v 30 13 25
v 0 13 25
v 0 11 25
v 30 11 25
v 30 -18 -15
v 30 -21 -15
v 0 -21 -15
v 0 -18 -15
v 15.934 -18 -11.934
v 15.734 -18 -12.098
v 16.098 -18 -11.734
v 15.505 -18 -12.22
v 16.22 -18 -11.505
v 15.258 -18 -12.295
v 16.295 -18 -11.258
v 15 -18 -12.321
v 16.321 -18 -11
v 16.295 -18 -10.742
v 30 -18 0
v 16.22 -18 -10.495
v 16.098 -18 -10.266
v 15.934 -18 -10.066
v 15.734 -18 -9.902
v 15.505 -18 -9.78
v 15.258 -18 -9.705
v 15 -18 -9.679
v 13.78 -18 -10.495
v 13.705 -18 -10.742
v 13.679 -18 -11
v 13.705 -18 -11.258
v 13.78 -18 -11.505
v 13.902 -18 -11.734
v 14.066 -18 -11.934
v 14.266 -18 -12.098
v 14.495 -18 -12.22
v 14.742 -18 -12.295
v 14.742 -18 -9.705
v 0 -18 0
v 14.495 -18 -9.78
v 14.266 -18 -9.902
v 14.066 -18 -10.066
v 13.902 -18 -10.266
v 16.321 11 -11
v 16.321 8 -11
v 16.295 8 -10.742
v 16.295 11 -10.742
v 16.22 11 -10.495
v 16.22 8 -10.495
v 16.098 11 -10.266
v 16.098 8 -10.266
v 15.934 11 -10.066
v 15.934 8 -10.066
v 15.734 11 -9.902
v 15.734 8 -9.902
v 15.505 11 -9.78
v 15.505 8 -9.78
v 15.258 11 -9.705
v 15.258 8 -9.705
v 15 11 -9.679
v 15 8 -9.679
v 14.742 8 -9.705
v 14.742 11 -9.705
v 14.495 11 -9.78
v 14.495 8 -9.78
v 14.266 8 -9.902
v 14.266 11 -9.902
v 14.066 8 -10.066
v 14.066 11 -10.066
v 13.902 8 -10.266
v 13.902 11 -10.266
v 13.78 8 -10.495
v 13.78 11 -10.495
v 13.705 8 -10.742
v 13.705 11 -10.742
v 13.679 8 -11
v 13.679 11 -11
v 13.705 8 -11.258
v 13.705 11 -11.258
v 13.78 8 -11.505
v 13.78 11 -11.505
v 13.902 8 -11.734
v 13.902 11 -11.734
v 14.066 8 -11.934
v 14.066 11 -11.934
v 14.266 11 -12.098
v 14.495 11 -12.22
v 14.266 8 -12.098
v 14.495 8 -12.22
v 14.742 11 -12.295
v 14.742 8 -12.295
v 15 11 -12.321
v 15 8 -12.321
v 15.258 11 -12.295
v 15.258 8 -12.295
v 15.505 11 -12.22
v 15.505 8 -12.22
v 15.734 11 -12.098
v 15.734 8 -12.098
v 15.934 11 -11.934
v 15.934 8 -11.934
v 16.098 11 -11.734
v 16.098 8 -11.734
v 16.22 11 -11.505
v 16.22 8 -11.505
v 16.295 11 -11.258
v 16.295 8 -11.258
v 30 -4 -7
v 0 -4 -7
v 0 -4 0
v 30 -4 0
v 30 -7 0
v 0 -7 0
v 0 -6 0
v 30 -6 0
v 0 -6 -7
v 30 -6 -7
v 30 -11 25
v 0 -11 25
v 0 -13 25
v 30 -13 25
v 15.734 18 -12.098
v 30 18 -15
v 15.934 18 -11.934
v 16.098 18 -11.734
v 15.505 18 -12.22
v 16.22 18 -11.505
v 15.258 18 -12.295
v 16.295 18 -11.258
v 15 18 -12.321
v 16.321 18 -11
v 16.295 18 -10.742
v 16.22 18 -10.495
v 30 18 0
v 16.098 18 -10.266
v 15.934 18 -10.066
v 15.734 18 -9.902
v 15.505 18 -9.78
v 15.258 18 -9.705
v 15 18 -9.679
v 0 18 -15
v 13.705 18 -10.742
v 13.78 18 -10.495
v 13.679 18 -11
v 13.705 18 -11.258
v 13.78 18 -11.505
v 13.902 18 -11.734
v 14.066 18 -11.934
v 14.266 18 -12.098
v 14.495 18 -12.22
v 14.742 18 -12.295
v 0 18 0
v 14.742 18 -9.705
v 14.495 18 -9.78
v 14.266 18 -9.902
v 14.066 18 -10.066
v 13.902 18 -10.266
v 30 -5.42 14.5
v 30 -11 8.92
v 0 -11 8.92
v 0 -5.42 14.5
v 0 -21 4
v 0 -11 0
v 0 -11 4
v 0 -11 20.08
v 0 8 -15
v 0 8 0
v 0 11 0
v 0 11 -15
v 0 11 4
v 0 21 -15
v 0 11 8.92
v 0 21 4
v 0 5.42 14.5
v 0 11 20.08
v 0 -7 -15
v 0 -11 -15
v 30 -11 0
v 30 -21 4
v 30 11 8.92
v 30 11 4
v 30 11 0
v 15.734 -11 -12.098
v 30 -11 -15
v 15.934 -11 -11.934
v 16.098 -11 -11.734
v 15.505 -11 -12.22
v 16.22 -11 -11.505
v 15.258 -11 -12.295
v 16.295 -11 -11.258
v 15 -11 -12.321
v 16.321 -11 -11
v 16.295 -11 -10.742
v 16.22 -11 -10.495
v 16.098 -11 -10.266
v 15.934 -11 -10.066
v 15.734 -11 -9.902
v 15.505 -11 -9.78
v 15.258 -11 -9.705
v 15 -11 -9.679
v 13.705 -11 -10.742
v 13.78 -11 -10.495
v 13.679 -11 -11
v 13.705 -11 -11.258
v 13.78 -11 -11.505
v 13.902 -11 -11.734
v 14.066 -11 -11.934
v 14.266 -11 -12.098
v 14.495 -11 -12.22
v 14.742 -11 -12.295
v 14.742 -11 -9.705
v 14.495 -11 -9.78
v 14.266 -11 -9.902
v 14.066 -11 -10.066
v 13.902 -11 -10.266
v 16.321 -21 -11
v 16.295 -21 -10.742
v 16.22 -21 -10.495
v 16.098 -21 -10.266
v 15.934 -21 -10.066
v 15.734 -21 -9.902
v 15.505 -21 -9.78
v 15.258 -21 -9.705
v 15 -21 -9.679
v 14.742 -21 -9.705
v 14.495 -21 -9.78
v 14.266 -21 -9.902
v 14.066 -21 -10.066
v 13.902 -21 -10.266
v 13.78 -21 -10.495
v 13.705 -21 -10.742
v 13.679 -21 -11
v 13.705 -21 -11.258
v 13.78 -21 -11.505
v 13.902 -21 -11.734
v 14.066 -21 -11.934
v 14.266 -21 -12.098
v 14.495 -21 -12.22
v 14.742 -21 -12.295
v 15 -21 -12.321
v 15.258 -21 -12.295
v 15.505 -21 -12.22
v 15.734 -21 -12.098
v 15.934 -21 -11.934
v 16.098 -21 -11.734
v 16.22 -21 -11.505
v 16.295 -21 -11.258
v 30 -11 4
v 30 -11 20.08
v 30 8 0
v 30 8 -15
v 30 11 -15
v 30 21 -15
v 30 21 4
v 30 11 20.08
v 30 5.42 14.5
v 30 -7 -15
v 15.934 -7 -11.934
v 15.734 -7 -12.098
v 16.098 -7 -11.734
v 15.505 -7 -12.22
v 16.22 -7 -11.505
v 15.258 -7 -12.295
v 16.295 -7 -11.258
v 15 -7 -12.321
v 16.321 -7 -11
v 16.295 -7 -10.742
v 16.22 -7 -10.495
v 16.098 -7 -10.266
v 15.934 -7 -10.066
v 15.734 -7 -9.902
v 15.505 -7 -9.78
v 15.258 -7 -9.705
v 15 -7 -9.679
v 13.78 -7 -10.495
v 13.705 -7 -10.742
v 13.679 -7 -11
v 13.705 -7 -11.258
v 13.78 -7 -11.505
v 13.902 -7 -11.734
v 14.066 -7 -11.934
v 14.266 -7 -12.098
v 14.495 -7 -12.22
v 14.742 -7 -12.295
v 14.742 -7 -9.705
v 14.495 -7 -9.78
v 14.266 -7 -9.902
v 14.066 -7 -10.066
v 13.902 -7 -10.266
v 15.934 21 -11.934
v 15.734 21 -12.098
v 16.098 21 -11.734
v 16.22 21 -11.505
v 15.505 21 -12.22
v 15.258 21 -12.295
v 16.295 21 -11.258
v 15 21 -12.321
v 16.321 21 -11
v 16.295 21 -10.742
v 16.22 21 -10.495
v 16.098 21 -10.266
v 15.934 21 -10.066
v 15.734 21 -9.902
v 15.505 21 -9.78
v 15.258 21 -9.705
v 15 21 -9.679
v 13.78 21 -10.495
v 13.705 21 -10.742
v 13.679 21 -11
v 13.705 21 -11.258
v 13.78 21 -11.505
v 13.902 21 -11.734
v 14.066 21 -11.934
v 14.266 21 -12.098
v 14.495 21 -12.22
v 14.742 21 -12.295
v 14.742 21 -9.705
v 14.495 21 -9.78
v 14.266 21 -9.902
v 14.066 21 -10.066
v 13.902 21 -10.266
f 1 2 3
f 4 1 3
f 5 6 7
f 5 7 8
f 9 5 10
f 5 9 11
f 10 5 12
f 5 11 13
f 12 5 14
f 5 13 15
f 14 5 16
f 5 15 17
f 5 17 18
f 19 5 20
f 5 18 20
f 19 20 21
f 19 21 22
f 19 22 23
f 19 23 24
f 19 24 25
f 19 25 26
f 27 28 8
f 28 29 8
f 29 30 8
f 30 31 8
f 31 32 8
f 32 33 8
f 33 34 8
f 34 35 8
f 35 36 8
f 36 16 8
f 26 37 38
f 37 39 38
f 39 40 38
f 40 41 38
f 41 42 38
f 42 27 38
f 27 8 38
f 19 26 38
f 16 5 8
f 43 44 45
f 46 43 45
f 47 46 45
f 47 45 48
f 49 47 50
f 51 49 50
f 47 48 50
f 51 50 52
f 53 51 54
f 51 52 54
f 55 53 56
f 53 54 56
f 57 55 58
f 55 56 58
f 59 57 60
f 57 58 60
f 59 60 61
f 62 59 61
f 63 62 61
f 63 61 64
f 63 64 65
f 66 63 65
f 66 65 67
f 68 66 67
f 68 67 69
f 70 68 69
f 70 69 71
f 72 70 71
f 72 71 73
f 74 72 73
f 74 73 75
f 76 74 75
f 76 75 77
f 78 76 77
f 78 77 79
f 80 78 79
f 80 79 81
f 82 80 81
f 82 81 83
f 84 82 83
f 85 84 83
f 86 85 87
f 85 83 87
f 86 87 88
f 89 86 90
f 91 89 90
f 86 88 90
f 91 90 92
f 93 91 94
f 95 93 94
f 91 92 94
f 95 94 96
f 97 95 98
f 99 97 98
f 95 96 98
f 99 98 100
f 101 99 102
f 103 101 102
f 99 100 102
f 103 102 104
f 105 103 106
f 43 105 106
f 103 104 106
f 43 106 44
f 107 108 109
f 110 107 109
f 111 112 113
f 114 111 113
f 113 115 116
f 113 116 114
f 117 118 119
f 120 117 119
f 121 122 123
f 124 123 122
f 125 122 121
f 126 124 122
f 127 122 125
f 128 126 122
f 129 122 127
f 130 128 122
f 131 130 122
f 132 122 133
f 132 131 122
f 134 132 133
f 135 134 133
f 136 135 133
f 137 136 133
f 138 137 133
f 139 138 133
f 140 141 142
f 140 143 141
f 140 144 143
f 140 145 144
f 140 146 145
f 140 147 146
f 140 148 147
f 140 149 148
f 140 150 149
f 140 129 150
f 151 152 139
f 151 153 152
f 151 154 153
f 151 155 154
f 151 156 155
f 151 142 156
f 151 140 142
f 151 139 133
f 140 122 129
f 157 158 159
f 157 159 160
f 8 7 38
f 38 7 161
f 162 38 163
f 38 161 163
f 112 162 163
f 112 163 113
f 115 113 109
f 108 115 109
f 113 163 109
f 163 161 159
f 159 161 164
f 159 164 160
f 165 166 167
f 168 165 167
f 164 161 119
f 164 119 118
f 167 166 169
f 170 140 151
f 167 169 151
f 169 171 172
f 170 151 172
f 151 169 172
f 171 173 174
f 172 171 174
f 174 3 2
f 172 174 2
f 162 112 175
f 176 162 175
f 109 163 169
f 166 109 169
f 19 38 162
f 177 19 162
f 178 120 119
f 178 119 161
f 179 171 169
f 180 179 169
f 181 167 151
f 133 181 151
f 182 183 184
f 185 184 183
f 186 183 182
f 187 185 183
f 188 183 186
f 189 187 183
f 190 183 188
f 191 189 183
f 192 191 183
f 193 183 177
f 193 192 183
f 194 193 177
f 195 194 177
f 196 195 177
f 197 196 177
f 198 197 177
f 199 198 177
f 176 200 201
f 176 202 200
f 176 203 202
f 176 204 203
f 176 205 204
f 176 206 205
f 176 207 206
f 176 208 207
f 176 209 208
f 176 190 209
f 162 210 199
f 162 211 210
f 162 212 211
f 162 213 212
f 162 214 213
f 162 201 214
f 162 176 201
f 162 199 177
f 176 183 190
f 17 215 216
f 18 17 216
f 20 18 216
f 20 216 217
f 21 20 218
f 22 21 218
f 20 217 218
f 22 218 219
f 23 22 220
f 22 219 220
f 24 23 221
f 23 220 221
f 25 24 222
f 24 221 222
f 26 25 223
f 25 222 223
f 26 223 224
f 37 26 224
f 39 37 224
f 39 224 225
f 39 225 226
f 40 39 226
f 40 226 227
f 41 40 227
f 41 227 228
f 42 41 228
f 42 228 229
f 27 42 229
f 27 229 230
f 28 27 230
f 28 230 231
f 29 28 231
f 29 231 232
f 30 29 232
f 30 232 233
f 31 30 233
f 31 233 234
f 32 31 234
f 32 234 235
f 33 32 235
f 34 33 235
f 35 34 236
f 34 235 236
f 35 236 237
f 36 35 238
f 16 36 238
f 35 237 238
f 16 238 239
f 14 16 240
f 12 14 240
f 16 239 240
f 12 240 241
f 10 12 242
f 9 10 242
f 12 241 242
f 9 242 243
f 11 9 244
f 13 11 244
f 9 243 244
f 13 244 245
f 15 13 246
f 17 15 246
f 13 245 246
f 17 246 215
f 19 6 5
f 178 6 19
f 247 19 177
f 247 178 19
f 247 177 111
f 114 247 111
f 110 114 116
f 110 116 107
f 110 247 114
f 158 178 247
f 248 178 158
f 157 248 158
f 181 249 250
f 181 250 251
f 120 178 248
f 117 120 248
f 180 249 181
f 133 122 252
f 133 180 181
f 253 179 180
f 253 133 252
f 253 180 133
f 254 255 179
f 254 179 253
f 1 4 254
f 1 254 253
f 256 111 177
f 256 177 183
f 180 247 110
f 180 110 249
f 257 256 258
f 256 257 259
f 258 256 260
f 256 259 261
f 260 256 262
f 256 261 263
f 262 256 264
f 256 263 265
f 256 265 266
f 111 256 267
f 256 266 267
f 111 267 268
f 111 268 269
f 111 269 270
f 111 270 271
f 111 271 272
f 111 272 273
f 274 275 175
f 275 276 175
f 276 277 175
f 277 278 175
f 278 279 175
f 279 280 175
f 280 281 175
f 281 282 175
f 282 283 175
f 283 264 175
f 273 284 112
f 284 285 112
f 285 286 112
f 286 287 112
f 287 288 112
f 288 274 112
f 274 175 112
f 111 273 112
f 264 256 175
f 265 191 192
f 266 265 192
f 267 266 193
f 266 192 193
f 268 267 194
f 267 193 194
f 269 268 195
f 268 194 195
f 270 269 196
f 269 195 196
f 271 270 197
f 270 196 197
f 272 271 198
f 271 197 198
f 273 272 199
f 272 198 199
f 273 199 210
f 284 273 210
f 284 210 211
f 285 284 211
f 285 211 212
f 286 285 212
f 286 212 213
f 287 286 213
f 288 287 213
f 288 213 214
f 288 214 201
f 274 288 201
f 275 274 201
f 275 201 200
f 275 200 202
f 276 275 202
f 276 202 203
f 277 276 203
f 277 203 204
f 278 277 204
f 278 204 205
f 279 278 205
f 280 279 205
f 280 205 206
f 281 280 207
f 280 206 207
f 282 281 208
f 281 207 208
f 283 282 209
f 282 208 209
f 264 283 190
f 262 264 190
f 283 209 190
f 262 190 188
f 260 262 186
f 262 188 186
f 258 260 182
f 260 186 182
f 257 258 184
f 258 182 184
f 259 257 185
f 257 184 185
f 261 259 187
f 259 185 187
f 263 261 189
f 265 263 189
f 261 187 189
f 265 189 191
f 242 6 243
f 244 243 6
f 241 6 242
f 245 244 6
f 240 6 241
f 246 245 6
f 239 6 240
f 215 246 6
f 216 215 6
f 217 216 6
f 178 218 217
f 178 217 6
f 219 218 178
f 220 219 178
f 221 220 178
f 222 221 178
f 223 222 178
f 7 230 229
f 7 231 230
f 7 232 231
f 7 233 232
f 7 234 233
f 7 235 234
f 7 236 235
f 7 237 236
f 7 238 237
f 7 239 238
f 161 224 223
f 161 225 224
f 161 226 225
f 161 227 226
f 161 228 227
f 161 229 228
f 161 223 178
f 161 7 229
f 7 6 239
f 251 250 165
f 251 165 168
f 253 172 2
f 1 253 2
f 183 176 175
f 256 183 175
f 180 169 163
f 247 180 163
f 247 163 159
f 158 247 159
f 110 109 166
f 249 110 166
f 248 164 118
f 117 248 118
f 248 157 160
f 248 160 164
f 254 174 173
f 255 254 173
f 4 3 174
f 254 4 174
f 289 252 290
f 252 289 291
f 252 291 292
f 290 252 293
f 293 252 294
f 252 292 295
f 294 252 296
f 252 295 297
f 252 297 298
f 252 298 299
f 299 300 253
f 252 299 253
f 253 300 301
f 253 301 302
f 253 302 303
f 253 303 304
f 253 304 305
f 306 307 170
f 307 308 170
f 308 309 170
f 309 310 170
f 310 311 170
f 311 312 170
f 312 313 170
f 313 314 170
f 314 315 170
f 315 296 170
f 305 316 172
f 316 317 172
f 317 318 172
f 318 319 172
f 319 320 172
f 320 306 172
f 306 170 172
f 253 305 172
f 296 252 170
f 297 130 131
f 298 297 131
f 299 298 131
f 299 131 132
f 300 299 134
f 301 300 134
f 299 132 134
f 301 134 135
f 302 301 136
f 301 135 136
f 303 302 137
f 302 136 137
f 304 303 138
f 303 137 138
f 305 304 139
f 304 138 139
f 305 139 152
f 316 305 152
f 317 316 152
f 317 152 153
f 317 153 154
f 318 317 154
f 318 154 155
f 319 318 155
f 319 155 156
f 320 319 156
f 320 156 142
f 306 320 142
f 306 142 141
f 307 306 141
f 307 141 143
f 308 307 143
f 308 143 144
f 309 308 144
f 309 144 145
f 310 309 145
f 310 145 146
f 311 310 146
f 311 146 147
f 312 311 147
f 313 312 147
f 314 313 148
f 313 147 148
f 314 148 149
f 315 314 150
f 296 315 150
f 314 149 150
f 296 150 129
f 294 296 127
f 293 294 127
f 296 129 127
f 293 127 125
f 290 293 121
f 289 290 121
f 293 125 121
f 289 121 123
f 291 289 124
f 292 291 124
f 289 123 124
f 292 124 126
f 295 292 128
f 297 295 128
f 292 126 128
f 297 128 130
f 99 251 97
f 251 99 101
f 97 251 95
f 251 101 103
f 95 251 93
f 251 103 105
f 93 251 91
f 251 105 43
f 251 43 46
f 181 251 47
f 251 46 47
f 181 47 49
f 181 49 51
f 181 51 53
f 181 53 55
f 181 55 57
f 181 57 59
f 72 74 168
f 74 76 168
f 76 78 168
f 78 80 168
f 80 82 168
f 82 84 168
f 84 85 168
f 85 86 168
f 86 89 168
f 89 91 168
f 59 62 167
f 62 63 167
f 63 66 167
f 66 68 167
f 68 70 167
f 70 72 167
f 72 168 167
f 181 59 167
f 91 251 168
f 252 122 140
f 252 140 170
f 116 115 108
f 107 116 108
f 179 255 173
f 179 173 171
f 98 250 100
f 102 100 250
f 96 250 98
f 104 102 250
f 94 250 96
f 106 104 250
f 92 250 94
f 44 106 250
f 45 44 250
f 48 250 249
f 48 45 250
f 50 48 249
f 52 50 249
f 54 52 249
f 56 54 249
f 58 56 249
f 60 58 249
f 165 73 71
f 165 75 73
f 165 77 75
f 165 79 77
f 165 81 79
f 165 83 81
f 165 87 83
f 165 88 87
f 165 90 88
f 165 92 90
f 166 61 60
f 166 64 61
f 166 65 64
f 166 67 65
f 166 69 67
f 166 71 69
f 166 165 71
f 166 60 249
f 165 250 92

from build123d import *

# Parameters (mm, degrees)
F1_DEPTH = 30
F2_W     = 3
F2_H     = 15
F3_DEPTH = 30
F2_W_2   = 4
F4_DEPTH = 30
F2_W_3   = 2
F2_H_2   = 7
F5_DEPTH = 30
F7_D     = 2.6416


with BuildPart() as f1:
    # F0 (on Right) → F1 (new body)
    with BuildSketch(Plane.YZ):
        Polygon((5.42, 14.5), (11, 8.92), (11, 20.08), align=None)
        Polygon((-11, 20.08), (-11, 8.92), (-5.42, 14.5), align=None)
        Polygon((-21, 4), (-21, 0), (0, 0), (0, 4), (-11, 4), align=None)
        Polygon((0, 4), (0, 0), (21, 0), (21, 4), (11, 4), align=None)
        Polygon((11, 4), (21, 4), (13, 25), (11, 25), (11, 20.08), (11, 8.92), align=None)
        Polygon((-13, 25), (-21, 4), (-11, 4), (-11, 8.92), (-11, 20.08), (-11, 25), align=None)
    extrude(amount=F1_DEPTH)

    # F2 (on Right) → F3 (join, through all)
    with BuildSketch(Plane.YZ):
        with Locations((-19.5, -7.5)):
            Rectangle(F2_W, F2_H)
        with Locations((9.5, -7.5)):
            Rectangle(F2_W, F2_H)
        with Locations((19.5, -7.5)):
            Rectangle(F2_W, F2_H)
    extrude(amount=F3_DEPTH)

    # F2 (on Right) → F4 (join, through all)
    with BuildSketch(Plane.YZ):
        with Locations((-9, -7.5)):
            Rectangle(F2_W_2, F2_H)
    extrude(amount=F4_DEPTH)

    # F2 (on Right) → F5 (join, through all)
    with BuildSketch(Plane.YZ):
        with Locations((-5, -3.5)):
            Rectangle(F2_W_3, F2_H_2)
    extrude(amount=F5_DEPTH)

    # F7 (through all)
    with Locations(Plane(origin=(0, 21, 0), x_dir=(-1, 0, 0), z_dir=(0, 1, 0))):
        with Locations((-15, -11)):
            Hole(F7_D / 2)


solid = f1.part
